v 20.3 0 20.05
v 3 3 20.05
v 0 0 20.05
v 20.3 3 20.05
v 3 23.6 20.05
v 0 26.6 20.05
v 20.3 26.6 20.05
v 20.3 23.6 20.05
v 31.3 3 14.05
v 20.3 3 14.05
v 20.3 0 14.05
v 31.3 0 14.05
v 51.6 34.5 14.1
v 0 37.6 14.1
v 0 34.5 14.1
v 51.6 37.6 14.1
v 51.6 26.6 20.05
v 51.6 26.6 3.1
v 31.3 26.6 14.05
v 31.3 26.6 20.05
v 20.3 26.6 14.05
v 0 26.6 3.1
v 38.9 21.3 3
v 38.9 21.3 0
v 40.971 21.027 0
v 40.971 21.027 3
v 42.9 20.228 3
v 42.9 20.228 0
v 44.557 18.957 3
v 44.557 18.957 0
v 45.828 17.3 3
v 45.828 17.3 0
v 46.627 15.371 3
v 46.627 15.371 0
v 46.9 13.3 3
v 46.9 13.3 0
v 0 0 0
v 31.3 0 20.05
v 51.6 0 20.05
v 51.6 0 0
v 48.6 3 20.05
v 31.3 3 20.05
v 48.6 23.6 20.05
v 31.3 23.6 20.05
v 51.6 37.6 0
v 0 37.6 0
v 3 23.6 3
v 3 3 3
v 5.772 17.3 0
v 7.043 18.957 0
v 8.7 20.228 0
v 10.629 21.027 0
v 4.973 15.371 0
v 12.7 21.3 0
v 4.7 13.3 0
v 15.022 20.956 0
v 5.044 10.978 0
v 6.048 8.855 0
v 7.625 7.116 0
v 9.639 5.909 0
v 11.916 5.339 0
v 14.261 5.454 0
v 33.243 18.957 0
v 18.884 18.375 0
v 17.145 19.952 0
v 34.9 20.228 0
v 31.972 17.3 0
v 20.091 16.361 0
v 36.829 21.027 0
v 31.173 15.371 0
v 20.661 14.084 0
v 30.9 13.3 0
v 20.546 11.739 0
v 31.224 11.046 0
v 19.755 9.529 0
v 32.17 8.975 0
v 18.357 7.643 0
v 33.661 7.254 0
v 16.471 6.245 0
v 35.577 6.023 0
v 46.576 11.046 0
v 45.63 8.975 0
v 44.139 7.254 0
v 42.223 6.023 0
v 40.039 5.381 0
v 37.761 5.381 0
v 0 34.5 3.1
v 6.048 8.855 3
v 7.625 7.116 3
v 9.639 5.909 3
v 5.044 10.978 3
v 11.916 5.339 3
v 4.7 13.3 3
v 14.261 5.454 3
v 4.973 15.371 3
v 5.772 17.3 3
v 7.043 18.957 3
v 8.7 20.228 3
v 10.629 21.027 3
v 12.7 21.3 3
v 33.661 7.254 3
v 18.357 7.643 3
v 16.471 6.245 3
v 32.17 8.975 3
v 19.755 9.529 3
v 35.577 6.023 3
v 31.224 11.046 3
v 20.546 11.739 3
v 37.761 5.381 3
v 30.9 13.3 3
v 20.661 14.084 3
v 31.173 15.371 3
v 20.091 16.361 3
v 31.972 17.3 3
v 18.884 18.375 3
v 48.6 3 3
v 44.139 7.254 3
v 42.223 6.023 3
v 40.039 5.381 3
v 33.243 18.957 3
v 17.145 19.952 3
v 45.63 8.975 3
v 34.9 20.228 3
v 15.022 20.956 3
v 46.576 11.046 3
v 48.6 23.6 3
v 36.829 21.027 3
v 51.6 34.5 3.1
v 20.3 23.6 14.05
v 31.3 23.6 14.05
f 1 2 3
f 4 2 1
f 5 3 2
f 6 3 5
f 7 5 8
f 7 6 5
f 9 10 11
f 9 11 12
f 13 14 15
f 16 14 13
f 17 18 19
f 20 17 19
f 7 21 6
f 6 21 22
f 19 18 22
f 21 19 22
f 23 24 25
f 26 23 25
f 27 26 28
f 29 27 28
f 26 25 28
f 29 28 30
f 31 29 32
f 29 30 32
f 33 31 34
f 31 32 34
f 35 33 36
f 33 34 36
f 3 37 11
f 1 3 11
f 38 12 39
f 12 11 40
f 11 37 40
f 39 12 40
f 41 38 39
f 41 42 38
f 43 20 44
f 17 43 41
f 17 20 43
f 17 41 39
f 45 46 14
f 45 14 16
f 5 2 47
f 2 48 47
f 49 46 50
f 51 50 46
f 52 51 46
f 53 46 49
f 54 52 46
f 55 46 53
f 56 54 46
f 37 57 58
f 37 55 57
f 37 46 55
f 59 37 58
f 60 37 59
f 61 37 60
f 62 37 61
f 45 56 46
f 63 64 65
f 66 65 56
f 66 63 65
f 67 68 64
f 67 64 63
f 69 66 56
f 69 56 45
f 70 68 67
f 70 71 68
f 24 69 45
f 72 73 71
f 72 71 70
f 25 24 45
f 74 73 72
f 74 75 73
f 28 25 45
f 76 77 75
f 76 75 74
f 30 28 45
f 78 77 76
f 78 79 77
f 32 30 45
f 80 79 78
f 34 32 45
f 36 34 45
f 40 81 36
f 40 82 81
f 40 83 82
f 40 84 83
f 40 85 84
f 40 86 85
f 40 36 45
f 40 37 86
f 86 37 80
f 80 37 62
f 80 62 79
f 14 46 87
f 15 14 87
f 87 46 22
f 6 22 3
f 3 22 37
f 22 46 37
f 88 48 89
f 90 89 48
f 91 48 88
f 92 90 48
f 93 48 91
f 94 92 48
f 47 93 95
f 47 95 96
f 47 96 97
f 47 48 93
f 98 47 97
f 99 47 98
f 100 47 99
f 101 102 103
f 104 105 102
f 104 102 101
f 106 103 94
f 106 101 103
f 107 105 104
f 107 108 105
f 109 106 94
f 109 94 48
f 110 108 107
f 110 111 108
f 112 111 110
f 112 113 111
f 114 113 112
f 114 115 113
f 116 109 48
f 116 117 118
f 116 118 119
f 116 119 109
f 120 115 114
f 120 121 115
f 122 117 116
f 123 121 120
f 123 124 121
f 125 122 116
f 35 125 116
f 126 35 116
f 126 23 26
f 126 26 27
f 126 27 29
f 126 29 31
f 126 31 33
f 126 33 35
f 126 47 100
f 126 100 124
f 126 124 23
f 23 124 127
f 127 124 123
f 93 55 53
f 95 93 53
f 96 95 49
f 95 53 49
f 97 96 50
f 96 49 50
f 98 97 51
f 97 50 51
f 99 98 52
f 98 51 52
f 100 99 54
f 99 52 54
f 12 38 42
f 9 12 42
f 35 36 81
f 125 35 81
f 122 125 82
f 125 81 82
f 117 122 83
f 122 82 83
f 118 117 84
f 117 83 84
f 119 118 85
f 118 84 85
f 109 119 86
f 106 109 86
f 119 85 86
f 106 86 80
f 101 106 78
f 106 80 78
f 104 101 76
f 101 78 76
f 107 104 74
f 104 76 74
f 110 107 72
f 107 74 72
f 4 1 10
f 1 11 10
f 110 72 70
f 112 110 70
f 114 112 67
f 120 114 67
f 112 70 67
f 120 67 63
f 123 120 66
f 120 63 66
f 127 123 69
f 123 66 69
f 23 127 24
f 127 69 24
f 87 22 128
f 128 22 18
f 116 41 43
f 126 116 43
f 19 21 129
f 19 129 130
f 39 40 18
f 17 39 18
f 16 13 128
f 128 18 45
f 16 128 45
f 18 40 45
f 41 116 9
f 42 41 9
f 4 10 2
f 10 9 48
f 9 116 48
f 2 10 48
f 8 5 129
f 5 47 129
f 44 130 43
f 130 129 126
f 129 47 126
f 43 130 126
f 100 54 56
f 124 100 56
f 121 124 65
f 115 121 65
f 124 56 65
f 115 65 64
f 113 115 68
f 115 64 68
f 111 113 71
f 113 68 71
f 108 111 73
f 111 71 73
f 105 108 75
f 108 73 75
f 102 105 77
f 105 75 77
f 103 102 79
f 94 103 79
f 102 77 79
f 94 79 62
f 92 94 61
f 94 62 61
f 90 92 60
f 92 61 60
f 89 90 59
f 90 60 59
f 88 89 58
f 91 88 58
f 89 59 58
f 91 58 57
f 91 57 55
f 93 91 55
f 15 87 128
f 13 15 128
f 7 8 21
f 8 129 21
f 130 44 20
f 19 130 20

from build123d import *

# Parameters (mm, degrees)
SKETCH1_W           = 51.6
SKETCH1_H           = 26.6
BOSS_EXTRUDE1_DEPTH = 23.05
CUT_EXTRUDE1_DEPTH  = 4
SKETCH3_W           = 45.6
SKETCH3_H           = 20.6
CUT_EXTRUDE2_DEPTH  = 16.05
SKETCH4_R           = 8
CUT_EXTRUDE3_DEPTH  = 3.1
SKETCH6_W           = 51.6
SKETCH6_H           = 3.1
BOSS_EXTRUDE2_DEPTH = 11
SKETCH7_W           = 51.6
SKETCH7_H           = 3.1
BOSS_EXTRUDE3_DEPTH = 11
SKETCH8_W           = 11
SKETCH8_H           = 26.6
CUT_EXTRUDE4_DEPTH  = 5
SKETCH9_W           = 51.6
SKETCH9_H           = 26.6
CUT_EXTRUDE5_DEPTH  = 5
BOSS_EXTRUDE4_DEPTH = 2


with BuildPart() as part:
    # Sketch1 → Boss-Extrude1 (new body)
    with BuildSketch(Plane.XY):
        with Locations((25.8, 13.3)):
            Rectangle(SKETCH1_W, SKETCH1_H)
    extrude(amount=BOSS_EXTRUDE1_DEPTH)

    # Sketch2 → Cut-Extrude1 (cut)
    with BuildSketch(Plane.XY.offset(23.05)):
        Polygon((20.3, 3), (20.3, 0), (31.3, 0), (31.3, 3), (48.6, 3), (48.6, 23.6), (31.3, 23.6), (31.3, 26.6), (20.3, 26.6), (20.3, 23.6), (3, 23.6), (3, 3), align=None)
    extrude(amount=-CUT_EXTRUDE1_DEPTH, mode=Mode.SUBTRACT)

    # Sketch3 → Cut-Extrude2 (cut)
    with BuildSketch(Plane.XY.offset(19.05)):
        with Locations((25.8, 13.3)):
            Rectangle(SKETCH3_W, SKETCH3_H)
    extrude(amount=-CUT_EXTRUDE2_DEPTH, mode=Mode.SUBTRACT)

    # Sketch4 → Cut-Extrude3 (cut)
    with BuildSketch(Plane(origin=(0, 0, 0), x_dir=(-1, 0, 0), z_dir=(0, 0, -1))):
        with Locations((-12.7, 13.3)):
            Circle(SKETCH4_R)
        with Locations((-38.9, 13.3)):
            Circle(SKETCH4_R)
    extrude(amount=-CUT_EXTRUDE3_DEPTH, mode=Mode.SUBTRACT)

    # Sketch6 → Boss-Extrude2 (add)
    with BuildSketch(Plane(origin=(0, 26.6, 0), x_dir=(1, 0, 0), z_dir=(0, 1, 0))):
        with Locations((25.8, -1.55)):
            Rectangle(SKETCH6_W, SKETCH6_H)
    extrude(amount=BOSS_EXTRUDE2_DEPTH)

    # Sketch7 → Boss-Extrude3 (add)
    with BuildSketch(Plane.XY.offset(3.1)):
        with Locations((25.8, 36.05)):
            Rectangle(SKETCH7_W, SKETCH7_H)
    extrude(amount=BOSS_EXTRUDE3_DEPTH)

    # Sketch8 → Cut-Extrude4 (cut)
    with BuildSketch(Plane.XY.offset(19.05)):
        with Locations((25.8, 13.3)):
            Rectangle(SKETCH8_W, SKETCH8_H)
    extrude(amount=-CUT_EXTRUDE4_DEPTH, mode=Mode.SUBTRACT)

    # Sketch9 → Cut-Extrude5 (cut)
    with BuildSketch(Plane.XY.offset(23.05)):
        with Locations((25.8, 13.3)):
            Rectangle(SKETCH9_W, SKETCH9_H)
    extrude(amount=-CUT_EXTRUDE5_DEPTH, mode=Mode.SUBTRACT)

    # Sketch10 → Boss-Extrude4 (add)
    with BuildSketch(Plane.XY.offset(18.05)):
        Polygon((0, 0), (20.3, 0), (20.3, 3), (3, 3), (3, 23.6), (20.3, 23.6), (20.3, 26.6), (0, 26.6), align=None)
        Polygon((31.3, 0), (51.6, 0), (51.6, 26.6), (31.3, 26.6), (31.3, 23.6), (48.6, 23.6), (48.6, 3), (31.3, 3), align=None)
    extrude(amount=BOSS_EXTRUDE4_DEPTH)


solid = part.part
